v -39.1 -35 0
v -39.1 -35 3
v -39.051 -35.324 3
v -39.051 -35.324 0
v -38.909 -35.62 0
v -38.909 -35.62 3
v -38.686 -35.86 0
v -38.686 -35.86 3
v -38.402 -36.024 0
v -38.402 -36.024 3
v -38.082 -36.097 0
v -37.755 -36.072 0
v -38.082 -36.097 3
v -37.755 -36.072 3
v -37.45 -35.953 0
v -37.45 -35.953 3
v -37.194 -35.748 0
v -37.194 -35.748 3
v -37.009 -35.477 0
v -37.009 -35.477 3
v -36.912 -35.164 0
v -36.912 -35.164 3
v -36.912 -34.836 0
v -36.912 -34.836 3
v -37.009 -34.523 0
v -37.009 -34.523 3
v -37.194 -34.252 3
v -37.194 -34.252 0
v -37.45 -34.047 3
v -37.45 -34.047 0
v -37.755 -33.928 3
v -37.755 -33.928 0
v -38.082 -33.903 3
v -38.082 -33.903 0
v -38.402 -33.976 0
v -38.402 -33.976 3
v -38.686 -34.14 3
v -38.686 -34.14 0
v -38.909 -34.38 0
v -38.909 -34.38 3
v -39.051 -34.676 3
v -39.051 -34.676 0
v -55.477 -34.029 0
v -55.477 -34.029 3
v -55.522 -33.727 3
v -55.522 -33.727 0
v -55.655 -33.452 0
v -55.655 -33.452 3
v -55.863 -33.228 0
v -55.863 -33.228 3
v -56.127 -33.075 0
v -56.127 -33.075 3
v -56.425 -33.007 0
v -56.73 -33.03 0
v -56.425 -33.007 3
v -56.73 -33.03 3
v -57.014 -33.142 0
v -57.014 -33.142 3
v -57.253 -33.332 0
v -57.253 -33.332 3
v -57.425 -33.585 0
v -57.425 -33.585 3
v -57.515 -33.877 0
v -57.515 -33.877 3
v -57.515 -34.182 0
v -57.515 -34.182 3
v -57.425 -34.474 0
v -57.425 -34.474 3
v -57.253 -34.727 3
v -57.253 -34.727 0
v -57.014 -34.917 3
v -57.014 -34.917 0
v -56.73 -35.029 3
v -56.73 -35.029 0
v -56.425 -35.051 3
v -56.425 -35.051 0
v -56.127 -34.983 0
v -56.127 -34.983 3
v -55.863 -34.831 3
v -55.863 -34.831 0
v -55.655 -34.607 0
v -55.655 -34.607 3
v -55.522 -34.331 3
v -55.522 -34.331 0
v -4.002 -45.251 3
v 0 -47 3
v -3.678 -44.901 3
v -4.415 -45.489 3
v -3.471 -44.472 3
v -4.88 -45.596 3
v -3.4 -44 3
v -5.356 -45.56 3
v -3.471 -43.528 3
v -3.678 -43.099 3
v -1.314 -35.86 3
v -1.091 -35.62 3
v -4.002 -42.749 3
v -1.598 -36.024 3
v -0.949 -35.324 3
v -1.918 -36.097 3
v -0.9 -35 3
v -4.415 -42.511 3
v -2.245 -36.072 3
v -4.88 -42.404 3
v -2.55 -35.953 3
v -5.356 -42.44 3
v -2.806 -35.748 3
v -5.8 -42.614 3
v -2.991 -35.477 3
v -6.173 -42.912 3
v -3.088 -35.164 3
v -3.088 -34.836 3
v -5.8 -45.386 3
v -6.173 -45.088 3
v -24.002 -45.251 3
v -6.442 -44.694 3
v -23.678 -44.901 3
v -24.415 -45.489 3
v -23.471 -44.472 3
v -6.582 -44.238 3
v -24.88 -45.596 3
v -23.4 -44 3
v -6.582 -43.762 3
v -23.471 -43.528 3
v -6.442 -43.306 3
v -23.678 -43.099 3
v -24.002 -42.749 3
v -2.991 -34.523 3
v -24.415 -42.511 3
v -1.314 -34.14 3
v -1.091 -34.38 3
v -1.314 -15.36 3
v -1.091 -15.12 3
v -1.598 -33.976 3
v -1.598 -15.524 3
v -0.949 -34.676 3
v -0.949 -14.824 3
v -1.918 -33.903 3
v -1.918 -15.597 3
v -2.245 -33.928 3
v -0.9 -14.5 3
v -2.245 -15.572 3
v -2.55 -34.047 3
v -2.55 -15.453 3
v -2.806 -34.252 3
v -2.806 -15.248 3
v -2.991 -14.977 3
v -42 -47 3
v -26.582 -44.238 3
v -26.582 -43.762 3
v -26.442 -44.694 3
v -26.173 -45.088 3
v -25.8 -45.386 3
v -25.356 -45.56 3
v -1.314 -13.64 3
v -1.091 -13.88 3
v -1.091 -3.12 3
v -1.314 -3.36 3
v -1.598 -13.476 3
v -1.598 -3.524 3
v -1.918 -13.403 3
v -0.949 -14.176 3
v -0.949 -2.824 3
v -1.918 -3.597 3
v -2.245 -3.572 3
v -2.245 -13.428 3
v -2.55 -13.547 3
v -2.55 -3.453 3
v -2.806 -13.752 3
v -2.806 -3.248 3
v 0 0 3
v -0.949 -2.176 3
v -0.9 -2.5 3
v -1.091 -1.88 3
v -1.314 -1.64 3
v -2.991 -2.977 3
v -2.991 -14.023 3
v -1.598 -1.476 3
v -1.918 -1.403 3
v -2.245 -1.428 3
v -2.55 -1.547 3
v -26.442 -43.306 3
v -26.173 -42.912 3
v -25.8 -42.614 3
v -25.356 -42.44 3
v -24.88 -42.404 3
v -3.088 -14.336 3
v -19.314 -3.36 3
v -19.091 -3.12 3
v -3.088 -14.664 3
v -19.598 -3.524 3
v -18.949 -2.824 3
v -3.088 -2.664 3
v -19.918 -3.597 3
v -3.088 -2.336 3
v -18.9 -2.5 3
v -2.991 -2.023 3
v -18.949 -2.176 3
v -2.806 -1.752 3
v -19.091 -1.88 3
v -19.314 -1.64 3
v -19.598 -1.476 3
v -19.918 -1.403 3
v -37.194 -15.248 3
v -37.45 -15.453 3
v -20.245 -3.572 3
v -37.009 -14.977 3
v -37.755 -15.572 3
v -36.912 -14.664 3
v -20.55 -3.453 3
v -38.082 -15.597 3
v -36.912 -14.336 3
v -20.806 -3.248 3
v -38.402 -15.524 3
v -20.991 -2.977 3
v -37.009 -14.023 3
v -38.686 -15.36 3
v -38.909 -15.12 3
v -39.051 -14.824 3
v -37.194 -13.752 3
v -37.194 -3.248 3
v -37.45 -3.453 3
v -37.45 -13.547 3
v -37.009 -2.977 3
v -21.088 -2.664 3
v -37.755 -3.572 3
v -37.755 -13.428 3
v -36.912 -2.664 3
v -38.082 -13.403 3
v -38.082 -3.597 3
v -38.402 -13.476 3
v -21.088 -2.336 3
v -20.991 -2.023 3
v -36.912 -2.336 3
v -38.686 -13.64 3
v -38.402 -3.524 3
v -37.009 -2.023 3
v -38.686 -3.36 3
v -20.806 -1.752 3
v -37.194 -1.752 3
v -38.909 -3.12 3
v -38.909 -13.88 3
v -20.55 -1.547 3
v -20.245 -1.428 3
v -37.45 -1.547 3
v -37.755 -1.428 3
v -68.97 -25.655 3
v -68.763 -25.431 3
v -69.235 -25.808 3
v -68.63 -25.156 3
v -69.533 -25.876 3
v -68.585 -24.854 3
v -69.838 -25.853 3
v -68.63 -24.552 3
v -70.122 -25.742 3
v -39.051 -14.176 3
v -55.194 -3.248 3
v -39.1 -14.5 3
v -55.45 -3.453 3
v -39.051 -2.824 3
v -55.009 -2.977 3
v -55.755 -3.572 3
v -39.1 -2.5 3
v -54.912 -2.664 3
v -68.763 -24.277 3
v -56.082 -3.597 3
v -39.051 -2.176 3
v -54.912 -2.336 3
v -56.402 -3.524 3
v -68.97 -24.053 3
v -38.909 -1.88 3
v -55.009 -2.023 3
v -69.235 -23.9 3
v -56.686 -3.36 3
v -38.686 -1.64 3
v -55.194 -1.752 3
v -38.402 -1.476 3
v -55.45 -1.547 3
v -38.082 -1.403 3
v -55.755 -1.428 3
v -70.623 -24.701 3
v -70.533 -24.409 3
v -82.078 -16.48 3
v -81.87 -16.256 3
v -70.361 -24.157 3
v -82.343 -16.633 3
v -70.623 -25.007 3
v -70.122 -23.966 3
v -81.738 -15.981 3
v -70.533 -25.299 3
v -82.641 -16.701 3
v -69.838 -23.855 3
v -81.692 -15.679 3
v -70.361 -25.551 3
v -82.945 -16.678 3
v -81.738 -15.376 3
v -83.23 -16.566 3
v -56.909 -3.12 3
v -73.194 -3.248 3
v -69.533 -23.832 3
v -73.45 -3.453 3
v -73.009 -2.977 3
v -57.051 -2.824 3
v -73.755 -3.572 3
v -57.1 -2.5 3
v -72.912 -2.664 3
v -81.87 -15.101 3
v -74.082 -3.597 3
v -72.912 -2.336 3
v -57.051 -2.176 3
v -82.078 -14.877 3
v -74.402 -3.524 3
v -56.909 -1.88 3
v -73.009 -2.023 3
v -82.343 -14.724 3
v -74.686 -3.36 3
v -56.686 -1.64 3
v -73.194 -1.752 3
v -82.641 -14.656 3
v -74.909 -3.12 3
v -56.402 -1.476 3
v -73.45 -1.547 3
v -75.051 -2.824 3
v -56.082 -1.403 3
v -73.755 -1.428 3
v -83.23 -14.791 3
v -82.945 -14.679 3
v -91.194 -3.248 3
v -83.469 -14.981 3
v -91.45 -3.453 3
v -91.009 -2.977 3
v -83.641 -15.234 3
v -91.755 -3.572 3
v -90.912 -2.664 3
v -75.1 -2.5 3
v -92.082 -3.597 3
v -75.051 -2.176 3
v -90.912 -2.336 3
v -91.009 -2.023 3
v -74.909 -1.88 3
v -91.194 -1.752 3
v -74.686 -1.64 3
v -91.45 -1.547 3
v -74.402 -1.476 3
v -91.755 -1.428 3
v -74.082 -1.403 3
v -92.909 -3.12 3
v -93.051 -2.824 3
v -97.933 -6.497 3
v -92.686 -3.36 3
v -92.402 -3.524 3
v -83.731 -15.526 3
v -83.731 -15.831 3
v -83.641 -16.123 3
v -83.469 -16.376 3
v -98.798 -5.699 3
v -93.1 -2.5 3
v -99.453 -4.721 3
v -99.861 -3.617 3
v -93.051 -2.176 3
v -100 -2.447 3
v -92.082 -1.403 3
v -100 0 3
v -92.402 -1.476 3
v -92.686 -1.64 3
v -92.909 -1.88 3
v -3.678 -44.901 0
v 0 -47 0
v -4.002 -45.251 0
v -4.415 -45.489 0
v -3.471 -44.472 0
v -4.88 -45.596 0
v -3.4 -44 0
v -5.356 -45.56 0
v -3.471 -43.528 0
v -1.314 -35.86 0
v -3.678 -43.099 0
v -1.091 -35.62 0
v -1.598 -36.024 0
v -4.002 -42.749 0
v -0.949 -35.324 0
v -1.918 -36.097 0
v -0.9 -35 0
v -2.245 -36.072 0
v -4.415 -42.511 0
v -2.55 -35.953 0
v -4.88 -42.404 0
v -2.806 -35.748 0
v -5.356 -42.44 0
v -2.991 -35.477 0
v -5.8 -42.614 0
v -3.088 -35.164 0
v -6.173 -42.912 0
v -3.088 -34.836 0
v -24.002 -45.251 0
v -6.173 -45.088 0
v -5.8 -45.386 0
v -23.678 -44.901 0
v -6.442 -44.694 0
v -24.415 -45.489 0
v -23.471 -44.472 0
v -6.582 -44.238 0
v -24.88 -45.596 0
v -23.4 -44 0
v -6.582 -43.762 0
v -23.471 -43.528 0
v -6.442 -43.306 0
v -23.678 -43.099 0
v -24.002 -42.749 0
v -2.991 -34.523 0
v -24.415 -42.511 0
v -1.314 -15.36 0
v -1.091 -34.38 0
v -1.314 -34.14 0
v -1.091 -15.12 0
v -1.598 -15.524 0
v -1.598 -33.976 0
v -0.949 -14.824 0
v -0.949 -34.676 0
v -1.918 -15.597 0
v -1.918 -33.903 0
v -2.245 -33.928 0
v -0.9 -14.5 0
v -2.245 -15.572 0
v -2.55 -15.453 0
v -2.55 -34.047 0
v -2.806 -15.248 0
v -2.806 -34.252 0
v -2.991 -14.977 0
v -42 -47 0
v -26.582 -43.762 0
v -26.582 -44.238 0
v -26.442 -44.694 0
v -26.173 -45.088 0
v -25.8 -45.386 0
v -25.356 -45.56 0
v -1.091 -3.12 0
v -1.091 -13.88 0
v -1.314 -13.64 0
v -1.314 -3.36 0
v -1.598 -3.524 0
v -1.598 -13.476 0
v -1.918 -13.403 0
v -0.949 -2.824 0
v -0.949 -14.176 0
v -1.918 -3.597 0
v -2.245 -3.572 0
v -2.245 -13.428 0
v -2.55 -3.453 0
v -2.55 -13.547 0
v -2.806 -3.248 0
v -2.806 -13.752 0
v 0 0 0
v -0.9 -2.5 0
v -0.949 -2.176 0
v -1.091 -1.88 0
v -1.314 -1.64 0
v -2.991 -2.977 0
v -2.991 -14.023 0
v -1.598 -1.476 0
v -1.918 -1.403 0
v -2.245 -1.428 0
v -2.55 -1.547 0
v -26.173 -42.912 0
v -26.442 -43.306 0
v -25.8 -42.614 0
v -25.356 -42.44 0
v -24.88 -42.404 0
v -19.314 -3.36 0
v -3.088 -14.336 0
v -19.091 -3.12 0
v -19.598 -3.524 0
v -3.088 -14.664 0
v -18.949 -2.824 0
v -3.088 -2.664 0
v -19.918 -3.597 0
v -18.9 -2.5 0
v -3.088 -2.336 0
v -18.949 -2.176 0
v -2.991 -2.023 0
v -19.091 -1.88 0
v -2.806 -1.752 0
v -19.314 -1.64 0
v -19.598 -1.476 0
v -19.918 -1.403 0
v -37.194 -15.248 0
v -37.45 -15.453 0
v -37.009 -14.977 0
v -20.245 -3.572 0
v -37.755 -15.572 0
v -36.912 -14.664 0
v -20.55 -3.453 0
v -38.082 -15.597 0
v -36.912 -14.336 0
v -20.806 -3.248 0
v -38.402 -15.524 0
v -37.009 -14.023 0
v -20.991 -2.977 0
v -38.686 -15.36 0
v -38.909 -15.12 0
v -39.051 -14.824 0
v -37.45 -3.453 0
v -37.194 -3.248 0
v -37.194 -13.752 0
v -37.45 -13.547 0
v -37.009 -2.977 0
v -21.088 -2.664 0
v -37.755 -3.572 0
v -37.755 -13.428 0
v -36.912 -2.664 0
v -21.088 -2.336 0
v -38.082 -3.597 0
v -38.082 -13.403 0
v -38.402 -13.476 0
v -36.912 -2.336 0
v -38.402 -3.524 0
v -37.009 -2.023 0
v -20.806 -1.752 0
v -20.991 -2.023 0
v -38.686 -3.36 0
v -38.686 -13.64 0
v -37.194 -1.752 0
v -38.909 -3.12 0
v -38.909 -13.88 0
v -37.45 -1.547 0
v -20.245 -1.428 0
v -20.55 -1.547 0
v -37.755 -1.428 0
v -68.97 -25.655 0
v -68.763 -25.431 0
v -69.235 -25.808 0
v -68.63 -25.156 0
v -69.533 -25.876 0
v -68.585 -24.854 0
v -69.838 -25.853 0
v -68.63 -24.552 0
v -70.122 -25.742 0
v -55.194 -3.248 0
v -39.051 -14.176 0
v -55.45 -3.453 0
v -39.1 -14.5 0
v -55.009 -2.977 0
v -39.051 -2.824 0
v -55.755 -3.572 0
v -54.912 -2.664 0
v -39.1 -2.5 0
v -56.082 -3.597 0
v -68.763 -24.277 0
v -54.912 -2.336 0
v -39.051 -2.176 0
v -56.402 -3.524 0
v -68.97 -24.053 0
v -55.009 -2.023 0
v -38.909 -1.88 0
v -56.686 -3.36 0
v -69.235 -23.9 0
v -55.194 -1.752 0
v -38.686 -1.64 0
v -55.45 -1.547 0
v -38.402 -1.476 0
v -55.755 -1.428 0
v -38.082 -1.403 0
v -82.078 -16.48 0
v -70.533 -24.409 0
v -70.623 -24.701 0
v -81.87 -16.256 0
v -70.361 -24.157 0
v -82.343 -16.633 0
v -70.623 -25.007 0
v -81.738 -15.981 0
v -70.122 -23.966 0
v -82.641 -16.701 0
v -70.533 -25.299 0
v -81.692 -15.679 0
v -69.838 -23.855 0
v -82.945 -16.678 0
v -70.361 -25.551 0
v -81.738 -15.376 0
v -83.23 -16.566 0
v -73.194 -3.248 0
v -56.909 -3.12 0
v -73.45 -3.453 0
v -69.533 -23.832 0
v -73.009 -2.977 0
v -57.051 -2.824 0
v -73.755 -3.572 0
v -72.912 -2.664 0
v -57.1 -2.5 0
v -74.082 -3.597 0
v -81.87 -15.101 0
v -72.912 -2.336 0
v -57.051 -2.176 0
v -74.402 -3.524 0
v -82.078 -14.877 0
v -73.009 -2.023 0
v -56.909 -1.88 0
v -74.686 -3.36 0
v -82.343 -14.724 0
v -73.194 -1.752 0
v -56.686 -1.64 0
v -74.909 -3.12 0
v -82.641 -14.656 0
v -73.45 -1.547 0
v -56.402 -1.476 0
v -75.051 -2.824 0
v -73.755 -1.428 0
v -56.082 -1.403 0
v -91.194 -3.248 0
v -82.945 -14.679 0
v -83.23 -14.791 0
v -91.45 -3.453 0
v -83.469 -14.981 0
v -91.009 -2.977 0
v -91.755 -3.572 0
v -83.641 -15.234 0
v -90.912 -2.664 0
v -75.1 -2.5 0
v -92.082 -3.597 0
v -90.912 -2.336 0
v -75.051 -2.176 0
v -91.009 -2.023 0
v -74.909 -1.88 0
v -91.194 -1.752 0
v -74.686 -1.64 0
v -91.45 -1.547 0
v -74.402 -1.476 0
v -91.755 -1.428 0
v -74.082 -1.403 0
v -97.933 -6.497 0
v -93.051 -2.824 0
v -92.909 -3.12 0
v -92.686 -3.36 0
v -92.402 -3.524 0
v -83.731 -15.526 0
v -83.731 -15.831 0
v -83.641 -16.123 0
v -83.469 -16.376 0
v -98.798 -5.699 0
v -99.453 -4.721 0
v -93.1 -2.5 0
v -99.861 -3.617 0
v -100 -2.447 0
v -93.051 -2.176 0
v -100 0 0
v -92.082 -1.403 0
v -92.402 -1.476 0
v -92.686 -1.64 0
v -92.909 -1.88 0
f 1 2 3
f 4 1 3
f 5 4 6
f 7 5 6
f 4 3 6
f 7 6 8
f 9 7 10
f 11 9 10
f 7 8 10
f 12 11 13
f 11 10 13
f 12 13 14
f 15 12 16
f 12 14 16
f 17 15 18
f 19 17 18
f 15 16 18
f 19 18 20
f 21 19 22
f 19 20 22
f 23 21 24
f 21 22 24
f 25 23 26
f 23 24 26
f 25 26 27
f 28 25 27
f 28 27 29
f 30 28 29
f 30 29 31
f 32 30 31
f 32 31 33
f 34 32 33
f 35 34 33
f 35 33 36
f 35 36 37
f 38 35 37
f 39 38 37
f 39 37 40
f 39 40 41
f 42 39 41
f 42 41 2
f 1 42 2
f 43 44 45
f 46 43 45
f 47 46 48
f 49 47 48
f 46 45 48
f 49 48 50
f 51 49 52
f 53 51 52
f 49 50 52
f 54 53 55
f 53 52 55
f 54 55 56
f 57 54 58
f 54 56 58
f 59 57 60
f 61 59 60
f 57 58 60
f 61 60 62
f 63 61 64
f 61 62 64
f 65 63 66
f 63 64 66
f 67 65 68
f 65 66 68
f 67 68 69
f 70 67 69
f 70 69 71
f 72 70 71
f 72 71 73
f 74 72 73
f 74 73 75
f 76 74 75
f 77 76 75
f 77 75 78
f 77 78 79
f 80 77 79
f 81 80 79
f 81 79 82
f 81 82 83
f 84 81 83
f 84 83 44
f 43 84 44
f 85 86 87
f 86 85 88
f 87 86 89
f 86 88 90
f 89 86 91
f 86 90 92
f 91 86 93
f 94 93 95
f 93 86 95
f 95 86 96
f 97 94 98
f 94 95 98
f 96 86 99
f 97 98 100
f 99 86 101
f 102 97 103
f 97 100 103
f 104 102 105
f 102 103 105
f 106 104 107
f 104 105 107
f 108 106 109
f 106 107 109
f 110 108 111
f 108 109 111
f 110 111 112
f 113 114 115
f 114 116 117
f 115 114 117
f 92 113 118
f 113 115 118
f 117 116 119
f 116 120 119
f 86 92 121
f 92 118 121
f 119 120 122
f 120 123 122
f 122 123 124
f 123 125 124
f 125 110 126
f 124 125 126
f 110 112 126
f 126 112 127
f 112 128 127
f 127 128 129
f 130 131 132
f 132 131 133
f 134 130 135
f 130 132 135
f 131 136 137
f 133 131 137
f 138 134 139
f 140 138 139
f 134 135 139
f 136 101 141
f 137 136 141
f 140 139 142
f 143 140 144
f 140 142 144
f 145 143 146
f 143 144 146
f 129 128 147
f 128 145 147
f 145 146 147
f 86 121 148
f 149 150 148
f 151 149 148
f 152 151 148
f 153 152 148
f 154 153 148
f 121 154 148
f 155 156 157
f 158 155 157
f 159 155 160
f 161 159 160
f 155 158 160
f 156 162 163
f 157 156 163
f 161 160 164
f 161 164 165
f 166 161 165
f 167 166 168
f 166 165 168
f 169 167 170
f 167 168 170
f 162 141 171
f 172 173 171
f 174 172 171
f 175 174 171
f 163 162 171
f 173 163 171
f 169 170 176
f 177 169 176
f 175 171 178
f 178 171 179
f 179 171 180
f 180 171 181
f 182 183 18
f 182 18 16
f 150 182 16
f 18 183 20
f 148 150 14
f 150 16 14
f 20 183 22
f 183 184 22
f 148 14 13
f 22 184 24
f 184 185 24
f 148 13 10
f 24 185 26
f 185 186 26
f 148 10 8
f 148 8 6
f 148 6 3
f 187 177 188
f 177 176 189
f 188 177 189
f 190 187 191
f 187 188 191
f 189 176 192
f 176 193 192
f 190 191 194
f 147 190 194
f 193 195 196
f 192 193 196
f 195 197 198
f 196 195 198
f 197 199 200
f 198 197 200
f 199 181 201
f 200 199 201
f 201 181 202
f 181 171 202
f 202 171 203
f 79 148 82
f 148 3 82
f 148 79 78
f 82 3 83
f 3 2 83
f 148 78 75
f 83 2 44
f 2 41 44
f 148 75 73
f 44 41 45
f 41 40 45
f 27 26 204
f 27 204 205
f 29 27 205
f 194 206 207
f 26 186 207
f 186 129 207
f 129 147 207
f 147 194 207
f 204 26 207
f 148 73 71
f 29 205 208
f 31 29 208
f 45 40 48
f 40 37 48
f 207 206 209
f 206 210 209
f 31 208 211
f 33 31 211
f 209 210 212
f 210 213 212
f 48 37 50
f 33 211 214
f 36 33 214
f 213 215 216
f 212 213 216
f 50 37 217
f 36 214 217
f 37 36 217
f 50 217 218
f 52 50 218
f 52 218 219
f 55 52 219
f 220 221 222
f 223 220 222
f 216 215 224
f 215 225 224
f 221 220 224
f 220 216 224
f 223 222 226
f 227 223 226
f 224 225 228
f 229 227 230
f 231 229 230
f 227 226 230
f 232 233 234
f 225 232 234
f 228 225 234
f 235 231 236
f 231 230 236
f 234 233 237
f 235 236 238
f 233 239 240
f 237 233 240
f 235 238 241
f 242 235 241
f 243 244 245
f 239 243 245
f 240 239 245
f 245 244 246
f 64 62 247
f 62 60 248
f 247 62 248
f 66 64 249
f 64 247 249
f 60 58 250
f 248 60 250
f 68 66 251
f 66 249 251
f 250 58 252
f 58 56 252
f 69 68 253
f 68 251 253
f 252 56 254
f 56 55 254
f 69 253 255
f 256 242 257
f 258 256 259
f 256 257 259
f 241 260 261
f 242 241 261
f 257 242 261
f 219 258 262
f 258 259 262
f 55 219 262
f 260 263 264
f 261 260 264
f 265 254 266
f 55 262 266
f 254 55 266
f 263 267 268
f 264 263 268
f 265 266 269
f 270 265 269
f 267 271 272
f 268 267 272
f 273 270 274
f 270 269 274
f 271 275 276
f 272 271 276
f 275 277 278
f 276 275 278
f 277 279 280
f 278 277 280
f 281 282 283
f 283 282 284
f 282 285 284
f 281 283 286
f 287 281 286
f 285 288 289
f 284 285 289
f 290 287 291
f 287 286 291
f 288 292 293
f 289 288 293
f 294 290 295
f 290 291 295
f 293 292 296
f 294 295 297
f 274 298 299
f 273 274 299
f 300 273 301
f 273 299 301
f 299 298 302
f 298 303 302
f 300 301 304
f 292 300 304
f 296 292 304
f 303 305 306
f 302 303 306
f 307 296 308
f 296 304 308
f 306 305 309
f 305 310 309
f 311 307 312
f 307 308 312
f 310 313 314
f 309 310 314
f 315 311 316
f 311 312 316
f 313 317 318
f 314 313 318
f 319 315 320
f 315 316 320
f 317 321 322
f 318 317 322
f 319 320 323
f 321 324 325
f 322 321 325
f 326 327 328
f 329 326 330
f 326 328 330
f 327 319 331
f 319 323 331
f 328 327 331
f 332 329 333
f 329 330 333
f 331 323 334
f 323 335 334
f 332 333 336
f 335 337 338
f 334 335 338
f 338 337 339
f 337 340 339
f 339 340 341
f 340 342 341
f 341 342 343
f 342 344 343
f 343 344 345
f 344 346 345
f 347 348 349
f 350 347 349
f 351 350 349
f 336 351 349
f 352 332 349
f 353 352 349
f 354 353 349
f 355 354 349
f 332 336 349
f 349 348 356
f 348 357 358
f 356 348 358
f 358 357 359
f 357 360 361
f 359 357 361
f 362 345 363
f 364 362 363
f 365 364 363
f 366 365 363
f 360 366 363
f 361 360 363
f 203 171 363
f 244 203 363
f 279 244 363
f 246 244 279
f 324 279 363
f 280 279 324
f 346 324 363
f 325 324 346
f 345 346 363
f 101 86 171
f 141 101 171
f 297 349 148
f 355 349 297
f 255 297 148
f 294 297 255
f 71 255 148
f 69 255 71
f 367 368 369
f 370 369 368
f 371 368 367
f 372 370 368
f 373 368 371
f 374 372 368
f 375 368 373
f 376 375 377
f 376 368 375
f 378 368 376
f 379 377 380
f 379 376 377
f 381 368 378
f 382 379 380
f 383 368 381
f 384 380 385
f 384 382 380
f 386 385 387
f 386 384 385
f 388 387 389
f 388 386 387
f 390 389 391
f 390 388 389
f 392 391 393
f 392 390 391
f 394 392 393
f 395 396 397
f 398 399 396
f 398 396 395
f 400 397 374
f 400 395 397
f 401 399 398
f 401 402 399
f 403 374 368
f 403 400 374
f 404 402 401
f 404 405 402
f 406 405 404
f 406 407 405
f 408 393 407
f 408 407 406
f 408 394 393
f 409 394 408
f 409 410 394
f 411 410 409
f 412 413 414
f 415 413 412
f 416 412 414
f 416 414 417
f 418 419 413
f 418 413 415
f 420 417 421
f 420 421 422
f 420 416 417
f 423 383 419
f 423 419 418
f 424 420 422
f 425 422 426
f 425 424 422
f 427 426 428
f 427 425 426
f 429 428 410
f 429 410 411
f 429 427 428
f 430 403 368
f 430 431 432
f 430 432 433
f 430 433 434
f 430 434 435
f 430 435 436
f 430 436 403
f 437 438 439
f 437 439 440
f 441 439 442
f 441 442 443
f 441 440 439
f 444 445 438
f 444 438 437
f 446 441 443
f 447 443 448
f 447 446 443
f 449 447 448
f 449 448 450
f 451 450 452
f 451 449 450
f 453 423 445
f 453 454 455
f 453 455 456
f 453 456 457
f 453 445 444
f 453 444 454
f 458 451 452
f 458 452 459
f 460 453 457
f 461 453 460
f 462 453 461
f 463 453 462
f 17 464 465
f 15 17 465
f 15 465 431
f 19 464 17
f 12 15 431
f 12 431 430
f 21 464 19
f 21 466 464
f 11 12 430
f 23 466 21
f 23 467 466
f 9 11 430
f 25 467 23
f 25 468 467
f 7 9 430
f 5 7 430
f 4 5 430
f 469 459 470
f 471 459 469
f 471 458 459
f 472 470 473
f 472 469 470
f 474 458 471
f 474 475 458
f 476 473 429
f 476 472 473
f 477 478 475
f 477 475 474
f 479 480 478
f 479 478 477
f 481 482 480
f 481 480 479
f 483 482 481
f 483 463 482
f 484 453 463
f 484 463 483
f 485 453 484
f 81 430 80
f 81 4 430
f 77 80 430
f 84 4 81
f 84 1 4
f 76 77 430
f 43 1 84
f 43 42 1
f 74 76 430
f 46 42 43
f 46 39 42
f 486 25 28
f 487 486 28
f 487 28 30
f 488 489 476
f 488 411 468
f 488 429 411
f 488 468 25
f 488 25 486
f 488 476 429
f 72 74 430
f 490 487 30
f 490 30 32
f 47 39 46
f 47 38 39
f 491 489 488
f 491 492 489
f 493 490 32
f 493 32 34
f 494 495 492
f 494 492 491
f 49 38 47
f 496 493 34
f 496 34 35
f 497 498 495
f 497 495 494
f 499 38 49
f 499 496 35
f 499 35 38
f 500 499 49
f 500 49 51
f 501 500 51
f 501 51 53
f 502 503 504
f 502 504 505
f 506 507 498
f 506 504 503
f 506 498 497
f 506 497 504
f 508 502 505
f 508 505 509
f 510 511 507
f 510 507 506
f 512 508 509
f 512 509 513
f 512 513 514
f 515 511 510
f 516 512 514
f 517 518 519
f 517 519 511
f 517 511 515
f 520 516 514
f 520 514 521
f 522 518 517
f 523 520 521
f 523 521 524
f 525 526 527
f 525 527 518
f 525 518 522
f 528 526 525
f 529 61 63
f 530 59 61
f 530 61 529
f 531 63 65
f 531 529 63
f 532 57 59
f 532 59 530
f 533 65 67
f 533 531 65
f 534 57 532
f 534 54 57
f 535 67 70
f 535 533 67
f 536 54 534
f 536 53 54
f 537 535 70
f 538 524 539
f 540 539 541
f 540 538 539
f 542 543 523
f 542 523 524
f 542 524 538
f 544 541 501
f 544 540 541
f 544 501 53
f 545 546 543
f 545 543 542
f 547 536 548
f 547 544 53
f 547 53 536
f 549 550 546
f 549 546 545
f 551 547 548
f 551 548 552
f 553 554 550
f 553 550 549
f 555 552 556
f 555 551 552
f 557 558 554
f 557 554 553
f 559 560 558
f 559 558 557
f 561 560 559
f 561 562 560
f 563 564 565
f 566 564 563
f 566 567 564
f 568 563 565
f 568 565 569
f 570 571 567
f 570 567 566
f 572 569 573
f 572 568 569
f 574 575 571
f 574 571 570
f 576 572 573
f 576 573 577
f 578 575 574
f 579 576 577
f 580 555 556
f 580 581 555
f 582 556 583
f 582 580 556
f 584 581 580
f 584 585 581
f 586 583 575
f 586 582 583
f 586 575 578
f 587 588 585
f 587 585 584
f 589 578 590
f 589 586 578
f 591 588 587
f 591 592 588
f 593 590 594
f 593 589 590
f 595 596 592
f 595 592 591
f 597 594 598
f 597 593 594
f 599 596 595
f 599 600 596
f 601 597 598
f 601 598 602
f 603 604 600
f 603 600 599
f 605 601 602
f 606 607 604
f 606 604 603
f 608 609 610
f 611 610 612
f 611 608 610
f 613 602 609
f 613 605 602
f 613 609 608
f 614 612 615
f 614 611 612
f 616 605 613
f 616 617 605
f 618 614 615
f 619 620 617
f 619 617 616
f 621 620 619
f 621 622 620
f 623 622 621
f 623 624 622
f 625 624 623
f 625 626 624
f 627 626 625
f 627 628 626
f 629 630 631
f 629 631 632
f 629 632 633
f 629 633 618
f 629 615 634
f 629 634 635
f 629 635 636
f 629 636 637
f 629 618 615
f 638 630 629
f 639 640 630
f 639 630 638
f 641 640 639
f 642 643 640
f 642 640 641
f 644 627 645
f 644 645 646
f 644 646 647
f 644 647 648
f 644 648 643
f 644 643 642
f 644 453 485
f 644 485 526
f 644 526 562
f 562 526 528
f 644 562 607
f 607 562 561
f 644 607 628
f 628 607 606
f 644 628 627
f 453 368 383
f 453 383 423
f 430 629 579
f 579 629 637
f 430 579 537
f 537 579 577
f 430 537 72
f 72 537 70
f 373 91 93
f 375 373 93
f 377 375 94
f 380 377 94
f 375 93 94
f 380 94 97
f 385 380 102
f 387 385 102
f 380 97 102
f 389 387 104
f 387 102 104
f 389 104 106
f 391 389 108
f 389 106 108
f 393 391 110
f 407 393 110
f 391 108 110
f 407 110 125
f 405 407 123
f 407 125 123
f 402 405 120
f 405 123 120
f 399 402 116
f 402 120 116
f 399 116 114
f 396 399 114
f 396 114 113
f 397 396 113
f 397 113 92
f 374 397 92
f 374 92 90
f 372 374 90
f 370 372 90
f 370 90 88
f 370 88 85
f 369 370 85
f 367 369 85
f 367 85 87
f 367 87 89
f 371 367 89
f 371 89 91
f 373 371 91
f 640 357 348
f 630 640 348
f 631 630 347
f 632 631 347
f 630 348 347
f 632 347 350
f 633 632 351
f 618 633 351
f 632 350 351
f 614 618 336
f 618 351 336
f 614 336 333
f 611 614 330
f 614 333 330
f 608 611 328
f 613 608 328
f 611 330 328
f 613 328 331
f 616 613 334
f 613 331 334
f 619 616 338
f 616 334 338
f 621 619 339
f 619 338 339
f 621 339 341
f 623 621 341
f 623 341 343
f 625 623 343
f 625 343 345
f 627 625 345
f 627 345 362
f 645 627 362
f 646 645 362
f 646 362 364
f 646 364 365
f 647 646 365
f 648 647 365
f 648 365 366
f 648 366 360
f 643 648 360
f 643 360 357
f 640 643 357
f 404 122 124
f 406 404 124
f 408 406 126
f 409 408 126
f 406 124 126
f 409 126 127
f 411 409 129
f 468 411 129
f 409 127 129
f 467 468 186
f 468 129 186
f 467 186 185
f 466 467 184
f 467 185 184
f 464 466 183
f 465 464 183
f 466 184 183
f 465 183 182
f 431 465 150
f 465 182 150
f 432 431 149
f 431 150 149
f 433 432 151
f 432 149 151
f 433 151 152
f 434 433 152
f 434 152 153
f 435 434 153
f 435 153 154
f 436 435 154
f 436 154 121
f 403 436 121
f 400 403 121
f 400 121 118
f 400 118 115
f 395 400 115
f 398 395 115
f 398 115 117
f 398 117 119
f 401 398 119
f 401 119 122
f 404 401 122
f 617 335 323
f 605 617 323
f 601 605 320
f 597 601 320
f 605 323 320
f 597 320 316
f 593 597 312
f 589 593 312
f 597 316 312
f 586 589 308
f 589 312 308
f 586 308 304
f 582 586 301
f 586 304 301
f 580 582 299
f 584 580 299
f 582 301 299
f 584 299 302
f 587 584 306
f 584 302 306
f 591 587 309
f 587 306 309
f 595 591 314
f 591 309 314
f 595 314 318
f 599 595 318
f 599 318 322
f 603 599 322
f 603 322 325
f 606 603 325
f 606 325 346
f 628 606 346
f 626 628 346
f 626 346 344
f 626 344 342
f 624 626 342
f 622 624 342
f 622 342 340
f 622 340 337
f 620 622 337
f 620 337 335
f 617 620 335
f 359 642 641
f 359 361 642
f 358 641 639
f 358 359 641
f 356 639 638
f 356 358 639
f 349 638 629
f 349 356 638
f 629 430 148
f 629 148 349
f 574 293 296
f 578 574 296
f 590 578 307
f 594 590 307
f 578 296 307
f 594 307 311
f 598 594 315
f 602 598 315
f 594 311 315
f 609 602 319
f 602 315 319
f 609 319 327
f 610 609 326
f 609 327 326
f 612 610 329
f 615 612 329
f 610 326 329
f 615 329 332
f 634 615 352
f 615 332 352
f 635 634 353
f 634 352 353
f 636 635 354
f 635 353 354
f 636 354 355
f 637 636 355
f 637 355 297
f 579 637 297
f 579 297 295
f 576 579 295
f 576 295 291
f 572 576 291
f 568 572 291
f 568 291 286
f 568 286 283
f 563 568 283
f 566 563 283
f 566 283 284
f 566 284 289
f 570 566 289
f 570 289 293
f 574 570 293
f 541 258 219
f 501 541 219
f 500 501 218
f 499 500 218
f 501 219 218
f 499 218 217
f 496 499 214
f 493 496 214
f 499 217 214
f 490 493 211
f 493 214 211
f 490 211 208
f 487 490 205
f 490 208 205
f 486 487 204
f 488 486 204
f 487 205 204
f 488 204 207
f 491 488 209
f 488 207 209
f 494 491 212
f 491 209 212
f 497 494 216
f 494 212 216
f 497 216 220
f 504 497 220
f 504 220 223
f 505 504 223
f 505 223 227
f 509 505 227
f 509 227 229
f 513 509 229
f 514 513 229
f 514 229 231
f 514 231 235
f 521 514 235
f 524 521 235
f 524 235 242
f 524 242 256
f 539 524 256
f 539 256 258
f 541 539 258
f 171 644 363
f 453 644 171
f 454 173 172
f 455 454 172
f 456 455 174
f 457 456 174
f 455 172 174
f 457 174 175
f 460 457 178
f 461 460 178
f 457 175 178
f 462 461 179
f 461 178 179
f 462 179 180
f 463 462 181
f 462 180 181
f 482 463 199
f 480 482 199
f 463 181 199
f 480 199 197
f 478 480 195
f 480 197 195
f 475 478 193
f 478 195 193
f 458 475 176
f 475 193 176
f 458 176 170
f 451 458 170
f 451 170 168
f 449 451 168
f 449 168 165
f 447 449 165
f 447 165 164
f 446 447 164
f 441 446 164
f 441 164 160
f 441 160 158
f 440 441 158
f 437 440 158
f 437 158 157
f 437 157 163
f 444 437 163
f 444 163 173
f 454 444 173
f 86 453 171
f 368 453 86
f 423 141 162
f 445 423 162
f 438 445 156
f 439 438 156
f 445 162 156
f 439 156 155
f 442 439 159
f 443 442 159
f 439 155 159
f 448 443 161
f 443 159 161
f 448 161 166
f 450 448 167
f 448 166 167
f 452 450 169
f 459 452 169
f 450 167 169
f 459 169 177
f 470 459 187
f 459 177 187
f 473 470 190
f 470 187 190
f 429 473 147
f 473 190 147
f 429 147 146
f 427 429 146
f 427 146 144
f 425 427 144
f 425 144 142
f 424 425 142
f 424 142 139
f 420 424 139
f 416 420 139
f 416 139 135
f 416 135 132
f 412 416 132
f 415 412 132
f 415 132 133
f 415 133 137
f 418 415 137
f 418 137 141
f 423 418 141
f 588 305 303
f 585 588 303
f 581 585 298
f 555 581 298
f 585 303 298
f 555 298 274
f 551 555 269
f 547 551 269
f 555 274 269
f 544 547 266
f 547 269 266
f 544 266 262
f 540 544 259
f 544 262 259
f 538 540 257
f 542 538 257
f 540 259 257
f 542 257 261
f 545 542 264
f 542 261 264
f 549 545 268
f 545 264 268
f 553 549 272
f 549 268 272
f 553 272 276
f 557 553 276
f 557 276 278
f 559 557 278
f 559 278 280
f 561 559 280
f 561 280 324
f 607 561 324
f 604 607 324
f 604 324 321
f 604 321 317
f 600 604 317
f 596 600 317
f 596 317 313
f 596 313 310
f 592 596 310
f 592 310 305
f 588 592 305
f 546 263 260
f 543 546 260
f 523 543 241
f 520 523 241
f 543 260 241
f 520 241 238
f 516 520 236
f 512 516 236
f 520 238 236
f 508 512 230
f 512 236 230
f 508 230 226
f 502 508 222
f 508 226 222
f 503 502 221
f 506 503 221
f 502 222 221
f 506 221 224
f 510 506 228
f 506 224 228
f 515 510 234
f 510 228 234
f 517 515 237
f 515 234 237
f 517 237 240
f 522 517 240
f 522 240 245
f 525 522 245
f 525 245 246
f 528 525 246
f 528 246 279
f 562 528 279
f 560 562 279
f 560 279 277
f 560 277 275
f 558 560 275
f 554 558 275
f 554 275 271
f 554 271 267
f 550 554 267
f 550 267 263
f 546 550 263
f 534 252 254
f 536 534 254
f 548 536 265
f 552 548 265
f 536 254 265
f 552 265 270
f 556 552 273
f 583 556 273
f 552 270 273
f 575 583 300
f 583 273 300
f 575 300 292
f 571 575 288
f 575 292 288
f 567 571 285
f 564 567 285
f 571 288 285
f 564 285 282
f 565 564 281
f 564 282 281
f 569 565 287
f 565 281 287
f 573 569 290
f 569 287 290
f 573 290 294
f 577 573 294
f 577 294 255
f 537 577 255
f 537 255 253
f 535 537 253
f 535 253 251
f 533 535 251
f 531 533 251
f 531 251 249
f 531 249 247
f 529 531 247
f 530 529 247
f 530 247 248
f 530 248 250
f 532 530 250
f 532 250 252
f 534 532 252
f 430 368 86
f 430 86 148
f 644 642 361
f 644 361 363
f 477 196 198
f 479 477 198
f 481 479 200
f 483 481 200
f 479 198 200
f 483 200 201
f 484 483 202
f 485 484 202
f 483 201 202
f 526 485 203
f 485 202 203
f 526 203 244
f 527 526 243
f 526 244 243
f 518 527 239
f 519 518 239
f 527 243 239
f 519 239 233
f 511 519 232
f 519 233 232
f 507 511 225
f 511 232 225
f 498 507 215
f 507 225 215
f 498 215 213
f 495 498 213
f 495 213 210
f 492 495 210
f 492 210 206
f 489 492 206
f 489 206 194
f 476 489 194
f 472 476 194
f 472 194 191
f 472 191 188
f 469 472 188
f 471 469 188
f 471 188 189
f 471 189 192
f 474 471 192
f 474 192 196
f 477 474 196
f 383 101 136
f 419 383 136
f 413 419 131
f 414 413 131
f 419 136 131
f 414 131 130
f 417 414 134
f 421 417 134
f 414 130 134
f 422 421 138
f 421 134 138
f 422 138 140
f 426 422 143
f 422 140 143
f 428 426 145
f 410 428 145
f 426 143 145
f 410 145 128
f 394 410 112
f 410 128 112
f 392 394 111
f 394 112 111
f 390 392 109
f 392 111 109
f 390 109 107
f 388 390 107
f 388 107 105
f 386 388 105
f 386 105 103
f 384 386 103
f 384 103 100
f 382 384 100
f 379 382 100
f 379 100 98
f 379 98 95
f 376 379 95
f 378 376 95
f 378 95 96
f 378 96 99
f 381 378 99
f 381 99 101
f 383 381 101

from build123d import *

# Parameters (mm, degrees)
EXTRUDE_1_DEPTH     = 3
SKETCH_2_R          = 1.1
SKETCH_2_R_2        = 1.025013192
SKETCH_2_R_3        = 1.6
CUT_EXTRUDE_2_DEPTH = 111.535062311
FILLET_1_R          = 5


with BuildPart() as part:
    # 草图1 → 凸台-拉伸1 (new body)
    with BuildSketch(Plane.XY):
        Polygon((0, 0), (0, -47), (-42, -47), (-100, -5), (-100, 0), align=None)
    extrude(amount=EXTRUDE_1_DEPTH)

    # 草图2 → 切除-拉伸2 (cut, through all)
    with BuildSketch(Plane.XY.offset(3)):
        with Locations(Location((-38, -35, 0), (0, 0, 180))):
            Circle(SKETCH_2_R)
        with Locations(Location((-38, -14.5, 0), (0, 0, 180))):
            Circle(SKETCH_2_R)
        with Locations(Location((-38, -2.5, 0), (0, 0, 180))):
            Circle(SKETCH_2_R)
        with Locations(Location((-56, -2.5, 0), (0, 0, 180))):
            Circle(SKETCH_2_R)
        with Locations(Location((-74, -2.5, 0), (0, 0, 180))):
            Circle(SKETCH_2_R)
        with Locations(Location((-92, -2.5, 0), (0, 0, 180))):
            Circle(SKETCH_2_R)
        with Locations((-56.501870582, -34.029333193)):
            Circle(SKETCH_2_R_2)
        with Locations((-69.609581311, -24.853935684)):
            Circle(SKETCH_2_R_2)
        with Locations((-82.717292039, -15.678538174)):
            Circle(SKETCH_2_R_2)
        with Locations((-20, -2.5)):
            Circle(SKETCH_2_R)
        with Locations((-2, -2.5)):
            Circle(SKETCH_2_R)
        with Locations((-2, -14.5)):
            Circle(SKETCH_2_R)
        with Locations((-2, -35)):
            Circle(SKETCH_2_R)
        with Locations((-5, -44)):
            Circle(SKETCH_2_R_3)
        with Locations((-25, -44)):
            Circle(SKETCH_2_R_3)
    extrude(amount=-CUT_EXTRUDE_2_DEPTH, mode=Mode.SUBTRACT)

    # 圆角1
    fillet_1_edges = [part.edges().sort_by_distance(p)[0] for p in [
        (-100, -5, 1.5),
    ]]
    fillet(fillet_1_edges, radius=FILLET_1_R)


solid = part.part
